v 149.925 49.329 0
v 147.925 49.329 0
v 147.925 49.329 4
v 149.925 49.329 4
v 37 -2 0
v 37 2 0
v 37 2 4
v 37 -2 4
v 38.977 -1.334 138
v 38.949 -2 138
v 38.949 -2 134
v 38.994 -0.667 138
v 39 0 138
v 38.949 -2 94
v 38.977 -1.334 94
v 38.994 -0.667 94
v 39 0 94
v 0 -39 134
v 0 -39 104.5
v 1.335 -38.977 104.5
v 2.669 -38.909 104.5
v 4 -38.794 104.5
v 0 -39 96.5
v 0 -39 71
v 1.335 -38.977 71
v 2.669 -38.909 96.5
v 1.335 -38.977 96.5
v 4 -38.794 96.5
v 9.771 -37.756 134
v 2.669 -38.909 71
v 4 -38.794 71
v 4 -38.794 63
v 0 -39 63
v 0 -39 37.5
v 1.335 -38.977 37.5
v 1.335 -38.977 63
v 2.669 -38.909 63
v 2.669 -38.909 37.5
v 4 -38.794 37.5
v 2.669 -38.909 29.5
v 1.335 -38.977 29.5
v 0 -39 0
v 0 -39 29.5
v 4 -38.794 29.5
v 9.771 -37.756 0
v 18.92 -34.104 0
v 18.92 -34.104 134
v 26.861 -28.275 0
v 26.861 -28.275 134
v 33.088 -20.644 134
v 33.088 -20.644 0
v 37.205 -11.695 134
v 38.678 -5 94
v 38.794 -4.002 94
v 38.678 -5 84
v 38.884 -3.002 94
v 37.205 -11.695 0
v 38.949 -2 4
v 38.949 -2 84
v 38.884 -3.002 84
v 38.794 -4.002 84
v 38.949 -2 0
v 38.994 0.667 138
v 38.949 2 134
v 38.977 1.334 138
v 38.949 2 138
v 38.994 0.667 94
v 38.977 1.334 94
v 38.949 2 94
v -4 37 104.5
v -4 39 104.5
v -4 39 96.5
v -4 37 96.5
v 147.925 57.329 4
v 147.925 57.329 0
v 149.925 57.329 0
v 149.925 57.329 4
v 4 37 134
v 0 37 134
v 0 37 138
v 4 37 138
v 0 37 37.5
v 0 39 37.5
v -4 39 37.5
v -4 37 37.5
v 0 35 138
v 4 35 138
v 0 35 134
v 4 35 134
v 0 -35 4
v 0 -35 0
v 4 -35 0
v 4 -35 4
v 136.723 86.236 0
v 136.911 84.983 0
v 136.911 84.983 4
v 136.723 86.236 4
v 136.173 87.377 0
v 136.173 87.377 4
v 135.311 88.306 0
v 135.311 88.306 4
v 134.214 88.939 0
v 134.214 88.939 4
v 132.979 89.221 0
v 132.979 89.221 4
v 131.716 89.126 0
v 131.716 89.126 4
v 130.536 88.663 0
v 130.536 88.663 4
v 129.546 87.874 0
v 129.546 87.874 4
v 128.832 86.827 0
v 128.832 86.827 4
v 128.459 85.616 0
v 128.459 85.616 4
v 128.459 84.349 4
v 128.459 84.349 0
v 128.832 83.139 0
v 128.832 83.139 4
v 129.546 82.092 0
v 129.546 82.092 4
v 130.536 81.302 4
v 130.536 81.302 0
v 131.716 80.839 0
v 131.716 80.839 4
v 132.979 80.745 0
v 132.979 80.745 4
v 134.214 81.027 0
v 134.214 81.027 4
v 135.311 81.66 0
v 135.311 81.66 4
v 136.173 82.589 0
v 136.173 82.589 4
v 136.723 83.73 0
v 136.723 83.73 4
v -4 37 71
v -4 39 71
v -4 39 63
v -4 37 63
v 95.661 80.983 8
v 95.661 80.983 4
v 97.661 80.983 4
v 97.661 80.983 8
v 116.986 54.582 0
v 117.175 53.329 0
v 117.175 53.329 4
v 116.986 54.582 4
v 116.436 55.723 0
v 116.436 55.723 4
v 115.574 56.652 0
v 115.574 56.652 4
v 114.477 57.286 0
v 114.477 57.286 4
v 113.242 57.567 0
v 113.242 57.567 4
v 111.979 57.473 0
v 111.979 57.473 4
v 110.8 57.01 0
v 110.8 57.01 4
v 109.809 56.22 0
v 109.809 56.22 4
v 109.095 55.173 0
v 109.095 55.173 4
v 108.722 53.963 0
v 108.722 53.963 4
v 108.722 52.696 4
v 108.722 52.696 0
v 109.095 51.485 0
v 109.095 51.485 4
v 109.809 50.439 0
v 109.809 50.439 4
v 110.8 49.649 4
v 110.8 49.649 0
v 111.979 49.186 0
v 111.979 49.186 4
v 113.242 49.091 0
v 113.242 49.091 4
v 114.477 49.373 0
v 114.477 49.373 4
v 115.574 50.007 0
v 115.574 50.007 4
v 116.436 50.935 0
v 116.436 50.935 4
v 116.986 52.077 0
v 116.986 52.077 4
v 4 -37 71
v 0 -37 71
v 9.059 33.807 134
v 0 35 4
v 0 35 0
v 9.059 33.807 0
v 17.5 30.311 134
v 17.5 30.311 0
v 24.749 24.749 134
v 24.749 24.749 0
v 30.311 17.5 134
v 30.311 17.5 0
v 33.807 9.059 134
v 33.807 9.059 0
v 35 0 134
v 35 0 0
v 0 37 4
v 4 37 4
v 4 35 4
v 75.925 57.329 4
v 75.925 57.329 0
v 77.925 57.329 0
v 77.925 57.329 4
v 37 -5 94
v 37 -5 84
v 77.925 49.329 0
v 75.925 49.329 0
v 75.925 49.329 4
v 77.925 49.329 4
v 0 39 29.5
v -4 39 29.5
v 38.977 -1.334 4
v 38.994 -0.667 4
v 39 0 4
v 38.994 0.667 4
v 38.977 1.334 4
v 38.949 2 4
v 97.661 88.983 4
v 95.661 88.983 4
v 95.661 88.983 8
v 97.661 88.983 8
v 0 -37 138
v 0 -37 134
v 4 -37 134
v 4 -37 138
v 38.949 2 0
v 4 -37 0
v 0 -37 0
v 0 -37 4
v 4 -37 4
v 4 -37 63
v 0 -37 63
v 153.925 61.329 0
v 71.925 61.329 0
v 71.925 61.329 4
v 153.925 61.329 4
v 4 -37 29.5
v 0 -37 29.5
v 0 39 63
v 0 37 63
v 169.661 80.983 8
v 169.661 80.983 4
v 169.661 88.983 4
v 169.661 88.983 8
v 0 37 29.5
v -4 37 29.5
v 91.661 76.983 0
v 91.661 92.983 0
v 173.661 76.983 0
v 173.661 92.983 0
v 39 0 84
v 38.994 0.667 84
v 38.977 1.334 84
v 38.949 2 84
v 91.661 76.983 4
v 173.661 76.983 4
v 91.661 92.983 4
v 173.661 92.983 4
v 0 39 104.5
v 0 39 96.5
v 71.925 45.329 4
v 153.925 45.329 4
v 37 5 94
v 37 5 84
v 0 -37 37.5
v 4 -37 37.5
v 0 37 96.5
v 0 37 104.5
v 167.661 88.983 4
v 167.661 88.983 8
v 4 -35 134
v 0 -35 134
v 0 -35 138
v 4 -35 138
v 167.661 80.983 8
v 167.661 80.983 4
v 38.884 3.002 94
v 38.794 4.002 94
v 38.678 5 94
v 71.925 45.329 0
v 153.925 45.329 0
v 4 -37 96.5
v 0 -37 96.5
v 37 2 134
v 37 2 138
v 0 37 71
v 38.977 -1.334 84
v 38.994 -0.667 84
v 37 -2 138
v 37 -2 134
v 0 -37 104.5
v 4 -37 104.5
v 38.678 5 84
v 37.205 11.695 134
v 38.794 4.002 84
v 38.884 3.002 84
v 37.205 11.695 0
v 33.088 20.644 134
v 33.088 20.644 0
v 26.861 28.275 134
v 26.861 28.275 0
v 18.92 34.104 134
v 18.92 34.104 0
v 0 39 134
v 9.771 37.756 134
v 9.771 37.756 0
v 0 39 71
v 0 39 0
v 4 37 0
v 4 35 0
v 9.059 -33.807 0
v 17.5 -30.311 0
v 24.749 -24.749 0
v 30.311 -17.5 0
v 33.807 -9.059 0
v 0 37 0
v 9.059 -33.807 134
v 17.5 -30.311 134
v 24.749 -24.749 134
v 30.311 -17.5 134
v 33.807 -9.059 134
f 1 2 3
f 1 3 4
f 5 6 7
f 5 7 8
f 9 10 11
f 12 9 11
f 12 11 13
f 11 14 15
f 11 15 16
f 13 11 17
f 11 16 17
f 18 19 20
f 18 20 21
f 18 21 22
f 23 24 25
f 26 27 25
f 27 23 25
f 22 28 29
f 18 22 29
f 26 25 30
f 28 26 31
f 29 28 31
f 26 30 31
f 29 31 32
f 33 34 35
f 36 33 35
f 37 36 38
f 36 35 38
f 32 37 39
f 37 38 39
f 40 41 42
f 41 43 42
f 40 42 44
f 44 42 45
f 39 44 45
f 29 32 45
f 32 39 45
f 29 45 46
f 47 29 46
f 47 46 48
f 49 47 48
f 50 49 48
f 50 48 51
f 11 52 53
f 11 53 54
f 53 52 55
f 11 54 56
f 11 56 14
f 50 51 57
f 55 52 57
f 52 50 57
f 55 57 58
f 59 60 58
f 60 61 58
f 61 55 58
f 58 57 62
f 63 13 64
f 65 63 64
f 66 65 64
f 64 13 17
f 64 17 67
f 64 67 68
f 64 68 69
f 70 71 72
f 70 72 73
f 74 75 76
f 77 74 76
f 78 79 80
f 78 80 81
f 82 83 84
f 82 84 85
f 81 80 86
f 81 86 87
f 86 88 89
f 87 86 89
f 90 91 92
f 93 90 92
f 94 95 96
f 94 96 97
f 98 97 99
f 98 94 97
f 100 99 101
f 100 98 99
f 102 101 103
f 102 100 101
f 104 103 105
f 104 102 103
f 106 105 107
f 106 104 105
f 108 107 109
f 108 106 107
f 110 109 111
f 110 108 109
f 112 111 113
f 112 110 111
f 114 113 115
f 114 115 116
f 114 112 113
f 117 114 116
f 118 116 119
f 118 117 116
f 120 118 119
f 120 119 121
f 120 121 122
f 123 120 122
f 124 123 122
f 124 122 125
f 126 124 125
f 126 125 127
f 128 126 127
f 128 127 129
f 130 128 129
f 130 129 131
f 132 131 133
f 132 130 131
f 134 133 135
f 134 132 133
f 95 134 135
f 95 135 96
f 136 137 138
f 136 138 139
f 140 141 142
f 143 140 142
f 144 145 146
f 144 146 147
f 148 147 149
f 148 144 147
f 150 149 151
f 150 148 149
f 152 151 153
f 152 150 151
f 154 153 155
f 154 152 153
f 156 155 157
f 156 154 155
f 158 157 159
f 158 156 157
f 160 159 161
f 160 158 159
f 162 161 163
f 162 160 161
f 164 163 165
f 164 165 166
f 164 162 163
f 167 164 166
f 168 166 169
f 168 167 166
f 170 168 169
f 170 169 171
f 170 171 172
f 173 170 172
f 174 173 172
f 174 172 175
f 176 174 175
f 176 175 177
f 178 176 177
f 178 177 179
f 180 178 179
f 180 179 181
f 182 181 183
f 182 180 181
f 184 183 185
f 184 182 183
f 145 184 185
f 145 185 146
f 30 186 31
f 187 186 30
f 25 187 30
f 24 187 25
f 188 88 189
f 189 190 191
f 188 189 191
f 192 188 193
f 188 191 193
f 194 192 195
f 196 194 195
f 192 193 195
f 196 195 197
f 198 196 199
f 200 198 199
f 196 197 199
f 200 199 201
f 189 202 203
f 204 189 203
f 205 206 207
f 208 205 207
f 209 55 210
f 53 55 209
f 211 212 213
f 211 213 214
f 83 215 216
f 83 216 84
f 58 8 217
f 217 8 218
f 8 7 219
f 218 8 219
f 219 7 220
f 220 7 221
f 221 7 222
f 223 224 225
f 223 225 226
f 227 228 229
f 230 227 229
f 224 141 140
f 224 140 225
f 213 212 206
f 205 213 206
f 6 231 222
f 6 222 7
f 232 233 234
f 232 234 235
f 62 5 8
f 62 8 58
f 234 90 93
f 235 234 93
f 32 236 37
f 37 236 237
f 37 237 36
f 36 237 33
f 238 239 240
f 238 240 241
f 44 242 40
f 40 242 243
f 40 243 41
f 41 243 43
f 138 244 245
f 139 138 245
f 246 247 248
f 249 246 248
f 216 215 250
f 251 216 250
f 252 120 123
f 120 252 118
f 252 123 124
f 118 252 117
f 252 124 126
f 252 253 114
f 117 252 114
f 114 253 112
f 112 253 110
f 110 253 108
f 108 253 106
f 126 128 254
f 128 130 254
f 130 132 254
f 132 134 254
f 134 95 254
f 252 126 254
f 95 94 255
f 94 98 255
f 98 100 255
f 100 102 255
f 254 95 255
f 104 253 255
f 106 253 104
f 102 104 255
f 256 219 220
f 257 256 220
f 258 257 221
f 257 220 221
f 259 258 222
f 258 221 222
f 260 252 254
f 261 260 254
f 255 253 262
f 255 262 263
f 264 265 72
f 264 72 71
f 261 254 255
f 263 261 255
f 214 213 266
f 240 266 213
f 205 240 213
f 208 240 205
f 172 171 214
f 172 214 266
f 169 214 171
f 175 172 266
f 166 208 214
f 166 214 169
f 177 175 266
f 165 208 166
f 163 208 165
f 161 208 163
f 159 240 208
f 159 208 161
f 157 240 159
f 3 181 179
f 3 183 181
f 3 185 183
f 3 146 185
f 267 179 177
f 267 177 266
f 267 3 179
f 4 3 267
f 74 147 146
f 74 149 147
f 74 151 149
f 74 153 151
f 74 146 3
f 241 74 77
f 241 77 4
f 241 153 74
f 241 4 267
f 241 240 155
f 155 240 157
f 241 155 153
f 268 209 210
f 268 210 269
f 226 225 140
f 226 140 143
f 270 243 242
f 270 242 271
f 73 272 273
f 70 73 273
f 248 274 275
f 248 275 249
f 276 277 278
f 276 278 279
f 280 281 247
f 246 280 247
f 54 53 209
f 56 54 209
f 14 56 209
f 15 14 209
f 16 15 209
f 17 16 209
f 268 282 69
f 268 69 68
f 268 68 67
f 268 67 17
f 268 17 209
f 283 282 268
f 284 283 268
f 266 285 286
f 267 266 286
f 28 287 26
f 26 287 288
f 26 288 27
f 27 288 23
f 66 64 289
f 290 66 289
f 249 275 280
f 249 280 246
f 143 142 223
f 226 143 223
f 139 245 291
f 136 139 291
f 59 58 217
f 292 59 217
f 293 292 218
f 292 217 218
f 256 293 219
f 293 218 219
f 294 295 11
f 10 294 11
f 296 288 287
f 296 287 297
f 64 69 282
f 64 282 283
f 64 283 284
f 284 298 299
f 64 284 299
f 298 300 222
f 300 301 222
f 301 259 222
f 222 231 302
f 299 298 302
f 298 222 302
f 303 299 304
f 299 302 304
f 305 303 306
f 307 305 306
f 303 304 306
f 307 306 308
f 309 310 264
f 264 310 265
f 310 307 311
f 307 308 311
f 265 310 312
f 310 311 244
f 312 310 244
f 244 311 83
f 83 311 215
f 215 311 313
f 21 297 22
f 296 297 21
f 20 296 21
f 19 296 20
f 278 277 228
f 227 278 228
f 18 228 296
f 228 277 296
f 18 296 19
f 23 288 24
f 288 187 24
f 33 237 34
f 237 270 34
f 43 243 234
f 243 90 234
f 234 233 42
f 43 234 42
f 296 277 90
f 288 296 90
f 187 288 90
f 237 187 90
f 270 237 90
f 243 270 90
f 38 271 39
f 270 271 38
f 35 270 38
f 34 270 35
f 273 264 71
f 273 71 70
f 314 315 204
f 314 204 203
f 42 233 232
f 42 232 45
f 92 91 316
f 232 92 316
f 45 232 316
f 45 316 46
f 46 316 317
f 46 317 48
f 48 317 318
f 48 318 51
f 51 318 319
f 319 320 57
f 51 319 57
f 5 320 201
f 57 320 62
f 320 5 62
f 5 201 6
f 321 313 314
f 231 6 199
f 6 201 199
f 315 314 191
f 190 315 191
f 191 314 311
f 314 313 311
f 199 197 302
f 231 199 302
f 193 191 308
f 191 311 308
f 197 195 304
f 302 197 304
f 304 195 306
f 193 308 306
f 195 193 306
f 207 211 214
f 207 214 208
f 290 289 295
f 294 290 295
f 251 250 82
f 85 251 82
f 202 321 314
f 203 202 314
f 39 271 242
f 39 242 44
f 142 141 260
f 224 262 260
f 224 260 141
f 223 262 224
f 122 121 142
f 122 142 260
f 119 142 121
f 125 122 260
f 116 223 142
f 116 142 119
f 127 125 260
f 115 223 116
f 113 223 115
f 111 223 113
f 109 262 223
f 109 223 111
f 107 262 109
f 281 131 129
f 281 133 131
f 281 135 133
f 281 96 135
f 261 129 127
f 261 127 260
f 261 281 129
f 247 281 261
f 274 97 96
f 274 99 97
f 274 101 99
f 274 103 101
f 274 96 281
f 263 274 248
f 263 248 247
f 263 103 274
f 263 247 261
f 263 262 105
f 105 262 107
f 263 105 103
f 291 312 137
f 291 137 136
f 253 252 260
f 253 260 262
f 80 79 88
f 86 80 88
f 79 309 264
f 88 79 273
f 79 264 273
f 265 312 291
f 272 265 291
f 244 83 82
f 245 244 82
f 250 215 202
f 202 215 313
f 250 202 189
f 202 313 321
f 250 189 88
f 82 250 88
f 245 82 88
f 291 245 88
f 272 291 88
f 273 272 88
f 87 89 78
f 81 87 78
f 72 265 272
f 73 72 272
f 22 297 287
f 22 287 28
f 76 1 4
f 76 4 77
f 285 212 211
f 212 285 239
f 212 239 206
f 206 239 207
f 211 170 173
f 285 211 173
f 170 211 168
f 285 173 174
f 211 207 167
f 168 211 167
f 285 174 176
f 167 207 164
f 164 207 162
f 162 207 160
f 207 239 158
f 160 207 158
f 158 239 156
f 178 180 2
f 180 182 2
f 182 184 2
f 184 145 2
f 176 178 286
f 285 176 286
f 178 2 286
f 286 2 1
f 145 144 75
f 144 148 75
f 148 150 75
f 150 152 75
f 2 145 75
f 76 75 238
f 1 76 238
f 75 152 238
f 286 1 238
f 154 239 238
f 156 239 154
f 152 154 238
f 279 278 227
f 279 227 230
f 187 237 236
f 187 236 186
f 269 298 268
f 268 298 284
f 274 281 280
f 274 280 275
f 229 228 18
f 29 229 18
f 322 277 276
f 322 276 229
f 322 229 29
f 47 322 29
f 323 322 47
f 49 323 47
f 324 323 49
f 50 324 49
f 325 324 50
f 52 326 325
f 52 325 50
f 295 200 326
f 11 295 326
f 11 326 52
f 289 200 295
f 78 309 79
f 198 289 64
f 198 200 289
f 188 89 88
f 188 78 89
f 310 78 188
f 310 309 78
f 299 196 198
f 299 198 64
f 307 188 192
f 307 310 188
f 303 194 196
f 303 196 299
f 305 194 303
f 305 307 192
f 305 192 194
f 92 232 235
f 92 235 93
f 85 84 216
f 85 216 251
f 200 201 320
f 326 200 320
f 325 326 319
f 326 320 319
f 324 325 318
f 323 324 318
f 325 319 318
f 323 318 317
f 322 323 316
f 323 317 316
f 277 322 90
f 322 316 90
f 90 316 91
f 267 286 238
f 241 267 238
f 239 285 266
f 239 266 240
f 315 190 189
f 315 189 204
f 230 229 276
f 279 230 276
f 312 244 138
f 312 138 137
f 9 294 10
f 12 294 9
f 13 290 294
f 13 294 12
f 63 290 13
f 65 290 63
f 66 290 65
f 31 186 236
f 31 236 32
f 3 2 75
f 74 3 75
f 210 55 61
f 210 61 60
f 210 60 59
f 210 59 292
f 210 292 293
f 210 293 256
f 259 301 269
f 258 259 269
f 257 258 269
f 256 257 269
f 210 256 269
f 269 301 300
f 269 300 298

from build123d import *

# Parameters (mm, degrees)
F0_W      = 4
F0_H      = 2
F1_DEPTH  = 134
F2_DEPTH  = 138
F3_DEPTH  = 4
F4_DEPTH  = 4
F5_W      = 2
F5_H      = 8
F6_DEPTH  = 4
F7_DEPTH  = 4
F9_W      = 10
F9_H      = 10
F10_DEPTH = 2
F11_W     = 82
F11_H     = 16
F11_W_2   = 2
F11_H_2   = 8
F11_R     = 4.25
F12_DEPTH = 4
F13_DEPTH = 4
F14_DEPTH = 8


with BuildPart() as f1:
    # F0 (on Top) → F1 (new body)
    with BuildSketch(Plane.XY):
        with BuildLine():
            ThreePointArc((0, 35), (24.748737, 24.748737), (35, 0))
            ThreePointArc((35, 0), (24.748737, -24.748737), (0, -35))
            Line((0, -35), (4, -35))
            Line((4, -35), (4, -37))
            Line((4, -37), (0, -37))
            Line((0, -37), (0, -39))
            ThreePointArc((0, -39), (26.860752, -28.275431), (38.948684, -2))
            Line((38.948684, -2), (37, -2))
            Line((37, -2), (37, 2))
            Line((37, 2), (38.948684, 2))
            ThreePointArc((38.948684, 2), (26.860752, 28.275431), (0, 39))
            Line((0, 39), (0, 37))
            Line((0, 37), (4, 37))
            Line((4, 37), (4, 35))
            Line((4, 35), (0, 35))
        make_face()
        with Locations((2, -36)):
            Rectangle(F0_W, F0_H)
        with Locations((2, 36)):
            Rectangle(F0_W, F0_H)
        with BuildLine():
            ThreePointArc((39, 0), (38.987169, 1.000329), (38.948684, 2))
            Line((38.948684, 2), (37, 2))
            Line((37, 2), (37, -2))
            Line((37, -2), (38.948684, -2))
            ThreePointArc((38.948684, -2), (38.987169, -1.000329), (39, 0))
        make_face()
    extrude(amount=F1_DEPTH)

    # F0 (on Top) → F2 (join)
    with BuildSketch(Plane.XY):
        with Locations((2, -36)):
            Rectangle(F0_W, F0_H)
        with BuildLine():
            ThreePointArc((39, 0), (38.987169, 1.000329), (38.948684, 2))
            Line((38.948684, 2), (37, 2))
            Line((37, 2), (37, -2))
            Line((37, -2), (38.948684, -2))
            ThreePointArc((38.948684, -2), (38.987169, -1.000329), (39, 0))
        make_face()
        with Locations((2, 36)):
            Rectangle(F0_W, F0_H)
    extrude(amount=F2_DEPTH)

    # F0 (on Top) → F3 (cut)
    with BuildSketch(Plane.XY):
        with Locations((2, -36)):
            Rectangle(F0_W, F0_H)
        with BuildLine():
            ThreePointArc((39, 0), (38.987169, 1.000329), (38.948684, 2))
            Line((38.948684, 2), (37, 2))
            Line((37, 2), (37, -2))
            Line((37, -2), (38.948684, -2))
            ThreePointArc((38.948684, -2), (38.987169, -1.000329), (39, 0))
        make_face()
        with Locations((2, 36)):
            Rectangle(F0_W, F0_H)
    extrude(amount=-F3_DEPTH, mode=Mode.SUBTRACT)

    # F0 (on Top) → F4 (cut)
    with BuildSketch(Plane.XY):
        with Locations((2, -36)):
            Rectangle(F0_W, F0_H)
        with BuildLine():
            ThreePointArc((39, 0), (38.987169, 1.000329), (38.948684, 2))
            Line((38.948684, 2), (37, 2))
            Line((37, 2), (37, -2))
            Line((37, -2), (38.948684, -2))
            ThreePointArc((38.948684, -2), (38.987169, -1.000329), (39, 0))
        make_face()
        with Locations((2, 36)):
            Rectangle(F0_W, F0_H)
    extrude(amount=F4_DEPTH, mode=Mode.SUBTRACT)

    # F5 (on face) → F6 (join)
    with BuildSketch(Plane(origin=(0, 0, 0), x_dir=(0, -1, 0), z_dir=(-1, 0, 0))):
        with Locations((-38, 100.5)):
            Rectangle(F5_W, F5_H)
        with Locations((-38, 67)):
            Rectangle(F5_W, F5_H)
        with Locations((-38, 33.5)):
            Rectangle(F5_W, F5_H)
    extrude(amount=F6_DEPTH)

    # F5 (on face) → F7 (cut)
    with BuildSketch(Plane(origin=(0, 0, 0), x_dir=(0, -1, 0), z_dir=(-1, 0, 0))):
        with Locations((38, 100.5)):
            Rectangle(F5_W, F5_H)
        with Locations((38, 67)):
            Rectangle(F5_W, F5_H)
        with Locations((38, 33.5)):
            Rectangle(F5_W, F5_H)
    extrude(amount=-F7_DEPTH, mode=Mode.SUBTRACT)

    # F9 (on offset) → F10 (cut)
    with BuildSketch(Plane.YZ.offset(39)):
        with Locations((0, 89)):
            Rectangle(F9_W, F9_H)
    extrude(amount=-F10_DEPTH, mode=Mode.SUBTRACT)


with BuildPart() as f12:
    # F11 (on Top) → F12 (new body)
    with BuildSketch(Plane.XY):
        with Locations((112.924552, 53.329299)):
            Rectangle(F11_W, F11_H)
        with Locations((76.924552, 53.329299)):
            Rectangle(F11_W_2, F11_H_2, mode=Mode.SUBTRACT)
        with Locations((112.924552, 53.329299)):
            Circle(F11_R, mode=Mode.SUBTRACT)
        with Locations((148.924552, 53.329299)):
            Rectangle(F11_W_2, F11_H_2, mode=Mode.SUBTRACT)
    extrude(amount=F12_DEPTH)


with BuildPart() as f13:
    # F11 (on Top) → F13 (new body)
    with BuildSketch(Plane.XY):
        with Locations((132.661327, 84.982826)):
            Rectangle(F11_W, F11_H)
        with Locations((96.661327, 84.982826)):
            Rectangle(F11_W_2, F11_H_2, mode=Mode.SUBTRACT)
        with Locations((132.661327, 84.982826)):
            Circle(F11_R, mode=Mode.SUBTRACT)
        with Locations((168.661327, 84.982826)):
            Rectangle(F11_W_2, F11_H_2, mode=Mode.SUBTRACT)
    extrude(amount=F13_DEPTH)

    # F11 (on Top) → F14 (join)
    with BuildSketch(Plane.XY):
        with Locations((168.661327, 84.982826)):
            Rectangle(F11_W_2, F11_H_2)
        with Locations((96.661327, 84.982826)):
            Rectangle(F11_W_2, F11_H_2)
    extrude(amount=F14_DEPTH)


solid = Compound([f1.part, f12.part, f13.part])
